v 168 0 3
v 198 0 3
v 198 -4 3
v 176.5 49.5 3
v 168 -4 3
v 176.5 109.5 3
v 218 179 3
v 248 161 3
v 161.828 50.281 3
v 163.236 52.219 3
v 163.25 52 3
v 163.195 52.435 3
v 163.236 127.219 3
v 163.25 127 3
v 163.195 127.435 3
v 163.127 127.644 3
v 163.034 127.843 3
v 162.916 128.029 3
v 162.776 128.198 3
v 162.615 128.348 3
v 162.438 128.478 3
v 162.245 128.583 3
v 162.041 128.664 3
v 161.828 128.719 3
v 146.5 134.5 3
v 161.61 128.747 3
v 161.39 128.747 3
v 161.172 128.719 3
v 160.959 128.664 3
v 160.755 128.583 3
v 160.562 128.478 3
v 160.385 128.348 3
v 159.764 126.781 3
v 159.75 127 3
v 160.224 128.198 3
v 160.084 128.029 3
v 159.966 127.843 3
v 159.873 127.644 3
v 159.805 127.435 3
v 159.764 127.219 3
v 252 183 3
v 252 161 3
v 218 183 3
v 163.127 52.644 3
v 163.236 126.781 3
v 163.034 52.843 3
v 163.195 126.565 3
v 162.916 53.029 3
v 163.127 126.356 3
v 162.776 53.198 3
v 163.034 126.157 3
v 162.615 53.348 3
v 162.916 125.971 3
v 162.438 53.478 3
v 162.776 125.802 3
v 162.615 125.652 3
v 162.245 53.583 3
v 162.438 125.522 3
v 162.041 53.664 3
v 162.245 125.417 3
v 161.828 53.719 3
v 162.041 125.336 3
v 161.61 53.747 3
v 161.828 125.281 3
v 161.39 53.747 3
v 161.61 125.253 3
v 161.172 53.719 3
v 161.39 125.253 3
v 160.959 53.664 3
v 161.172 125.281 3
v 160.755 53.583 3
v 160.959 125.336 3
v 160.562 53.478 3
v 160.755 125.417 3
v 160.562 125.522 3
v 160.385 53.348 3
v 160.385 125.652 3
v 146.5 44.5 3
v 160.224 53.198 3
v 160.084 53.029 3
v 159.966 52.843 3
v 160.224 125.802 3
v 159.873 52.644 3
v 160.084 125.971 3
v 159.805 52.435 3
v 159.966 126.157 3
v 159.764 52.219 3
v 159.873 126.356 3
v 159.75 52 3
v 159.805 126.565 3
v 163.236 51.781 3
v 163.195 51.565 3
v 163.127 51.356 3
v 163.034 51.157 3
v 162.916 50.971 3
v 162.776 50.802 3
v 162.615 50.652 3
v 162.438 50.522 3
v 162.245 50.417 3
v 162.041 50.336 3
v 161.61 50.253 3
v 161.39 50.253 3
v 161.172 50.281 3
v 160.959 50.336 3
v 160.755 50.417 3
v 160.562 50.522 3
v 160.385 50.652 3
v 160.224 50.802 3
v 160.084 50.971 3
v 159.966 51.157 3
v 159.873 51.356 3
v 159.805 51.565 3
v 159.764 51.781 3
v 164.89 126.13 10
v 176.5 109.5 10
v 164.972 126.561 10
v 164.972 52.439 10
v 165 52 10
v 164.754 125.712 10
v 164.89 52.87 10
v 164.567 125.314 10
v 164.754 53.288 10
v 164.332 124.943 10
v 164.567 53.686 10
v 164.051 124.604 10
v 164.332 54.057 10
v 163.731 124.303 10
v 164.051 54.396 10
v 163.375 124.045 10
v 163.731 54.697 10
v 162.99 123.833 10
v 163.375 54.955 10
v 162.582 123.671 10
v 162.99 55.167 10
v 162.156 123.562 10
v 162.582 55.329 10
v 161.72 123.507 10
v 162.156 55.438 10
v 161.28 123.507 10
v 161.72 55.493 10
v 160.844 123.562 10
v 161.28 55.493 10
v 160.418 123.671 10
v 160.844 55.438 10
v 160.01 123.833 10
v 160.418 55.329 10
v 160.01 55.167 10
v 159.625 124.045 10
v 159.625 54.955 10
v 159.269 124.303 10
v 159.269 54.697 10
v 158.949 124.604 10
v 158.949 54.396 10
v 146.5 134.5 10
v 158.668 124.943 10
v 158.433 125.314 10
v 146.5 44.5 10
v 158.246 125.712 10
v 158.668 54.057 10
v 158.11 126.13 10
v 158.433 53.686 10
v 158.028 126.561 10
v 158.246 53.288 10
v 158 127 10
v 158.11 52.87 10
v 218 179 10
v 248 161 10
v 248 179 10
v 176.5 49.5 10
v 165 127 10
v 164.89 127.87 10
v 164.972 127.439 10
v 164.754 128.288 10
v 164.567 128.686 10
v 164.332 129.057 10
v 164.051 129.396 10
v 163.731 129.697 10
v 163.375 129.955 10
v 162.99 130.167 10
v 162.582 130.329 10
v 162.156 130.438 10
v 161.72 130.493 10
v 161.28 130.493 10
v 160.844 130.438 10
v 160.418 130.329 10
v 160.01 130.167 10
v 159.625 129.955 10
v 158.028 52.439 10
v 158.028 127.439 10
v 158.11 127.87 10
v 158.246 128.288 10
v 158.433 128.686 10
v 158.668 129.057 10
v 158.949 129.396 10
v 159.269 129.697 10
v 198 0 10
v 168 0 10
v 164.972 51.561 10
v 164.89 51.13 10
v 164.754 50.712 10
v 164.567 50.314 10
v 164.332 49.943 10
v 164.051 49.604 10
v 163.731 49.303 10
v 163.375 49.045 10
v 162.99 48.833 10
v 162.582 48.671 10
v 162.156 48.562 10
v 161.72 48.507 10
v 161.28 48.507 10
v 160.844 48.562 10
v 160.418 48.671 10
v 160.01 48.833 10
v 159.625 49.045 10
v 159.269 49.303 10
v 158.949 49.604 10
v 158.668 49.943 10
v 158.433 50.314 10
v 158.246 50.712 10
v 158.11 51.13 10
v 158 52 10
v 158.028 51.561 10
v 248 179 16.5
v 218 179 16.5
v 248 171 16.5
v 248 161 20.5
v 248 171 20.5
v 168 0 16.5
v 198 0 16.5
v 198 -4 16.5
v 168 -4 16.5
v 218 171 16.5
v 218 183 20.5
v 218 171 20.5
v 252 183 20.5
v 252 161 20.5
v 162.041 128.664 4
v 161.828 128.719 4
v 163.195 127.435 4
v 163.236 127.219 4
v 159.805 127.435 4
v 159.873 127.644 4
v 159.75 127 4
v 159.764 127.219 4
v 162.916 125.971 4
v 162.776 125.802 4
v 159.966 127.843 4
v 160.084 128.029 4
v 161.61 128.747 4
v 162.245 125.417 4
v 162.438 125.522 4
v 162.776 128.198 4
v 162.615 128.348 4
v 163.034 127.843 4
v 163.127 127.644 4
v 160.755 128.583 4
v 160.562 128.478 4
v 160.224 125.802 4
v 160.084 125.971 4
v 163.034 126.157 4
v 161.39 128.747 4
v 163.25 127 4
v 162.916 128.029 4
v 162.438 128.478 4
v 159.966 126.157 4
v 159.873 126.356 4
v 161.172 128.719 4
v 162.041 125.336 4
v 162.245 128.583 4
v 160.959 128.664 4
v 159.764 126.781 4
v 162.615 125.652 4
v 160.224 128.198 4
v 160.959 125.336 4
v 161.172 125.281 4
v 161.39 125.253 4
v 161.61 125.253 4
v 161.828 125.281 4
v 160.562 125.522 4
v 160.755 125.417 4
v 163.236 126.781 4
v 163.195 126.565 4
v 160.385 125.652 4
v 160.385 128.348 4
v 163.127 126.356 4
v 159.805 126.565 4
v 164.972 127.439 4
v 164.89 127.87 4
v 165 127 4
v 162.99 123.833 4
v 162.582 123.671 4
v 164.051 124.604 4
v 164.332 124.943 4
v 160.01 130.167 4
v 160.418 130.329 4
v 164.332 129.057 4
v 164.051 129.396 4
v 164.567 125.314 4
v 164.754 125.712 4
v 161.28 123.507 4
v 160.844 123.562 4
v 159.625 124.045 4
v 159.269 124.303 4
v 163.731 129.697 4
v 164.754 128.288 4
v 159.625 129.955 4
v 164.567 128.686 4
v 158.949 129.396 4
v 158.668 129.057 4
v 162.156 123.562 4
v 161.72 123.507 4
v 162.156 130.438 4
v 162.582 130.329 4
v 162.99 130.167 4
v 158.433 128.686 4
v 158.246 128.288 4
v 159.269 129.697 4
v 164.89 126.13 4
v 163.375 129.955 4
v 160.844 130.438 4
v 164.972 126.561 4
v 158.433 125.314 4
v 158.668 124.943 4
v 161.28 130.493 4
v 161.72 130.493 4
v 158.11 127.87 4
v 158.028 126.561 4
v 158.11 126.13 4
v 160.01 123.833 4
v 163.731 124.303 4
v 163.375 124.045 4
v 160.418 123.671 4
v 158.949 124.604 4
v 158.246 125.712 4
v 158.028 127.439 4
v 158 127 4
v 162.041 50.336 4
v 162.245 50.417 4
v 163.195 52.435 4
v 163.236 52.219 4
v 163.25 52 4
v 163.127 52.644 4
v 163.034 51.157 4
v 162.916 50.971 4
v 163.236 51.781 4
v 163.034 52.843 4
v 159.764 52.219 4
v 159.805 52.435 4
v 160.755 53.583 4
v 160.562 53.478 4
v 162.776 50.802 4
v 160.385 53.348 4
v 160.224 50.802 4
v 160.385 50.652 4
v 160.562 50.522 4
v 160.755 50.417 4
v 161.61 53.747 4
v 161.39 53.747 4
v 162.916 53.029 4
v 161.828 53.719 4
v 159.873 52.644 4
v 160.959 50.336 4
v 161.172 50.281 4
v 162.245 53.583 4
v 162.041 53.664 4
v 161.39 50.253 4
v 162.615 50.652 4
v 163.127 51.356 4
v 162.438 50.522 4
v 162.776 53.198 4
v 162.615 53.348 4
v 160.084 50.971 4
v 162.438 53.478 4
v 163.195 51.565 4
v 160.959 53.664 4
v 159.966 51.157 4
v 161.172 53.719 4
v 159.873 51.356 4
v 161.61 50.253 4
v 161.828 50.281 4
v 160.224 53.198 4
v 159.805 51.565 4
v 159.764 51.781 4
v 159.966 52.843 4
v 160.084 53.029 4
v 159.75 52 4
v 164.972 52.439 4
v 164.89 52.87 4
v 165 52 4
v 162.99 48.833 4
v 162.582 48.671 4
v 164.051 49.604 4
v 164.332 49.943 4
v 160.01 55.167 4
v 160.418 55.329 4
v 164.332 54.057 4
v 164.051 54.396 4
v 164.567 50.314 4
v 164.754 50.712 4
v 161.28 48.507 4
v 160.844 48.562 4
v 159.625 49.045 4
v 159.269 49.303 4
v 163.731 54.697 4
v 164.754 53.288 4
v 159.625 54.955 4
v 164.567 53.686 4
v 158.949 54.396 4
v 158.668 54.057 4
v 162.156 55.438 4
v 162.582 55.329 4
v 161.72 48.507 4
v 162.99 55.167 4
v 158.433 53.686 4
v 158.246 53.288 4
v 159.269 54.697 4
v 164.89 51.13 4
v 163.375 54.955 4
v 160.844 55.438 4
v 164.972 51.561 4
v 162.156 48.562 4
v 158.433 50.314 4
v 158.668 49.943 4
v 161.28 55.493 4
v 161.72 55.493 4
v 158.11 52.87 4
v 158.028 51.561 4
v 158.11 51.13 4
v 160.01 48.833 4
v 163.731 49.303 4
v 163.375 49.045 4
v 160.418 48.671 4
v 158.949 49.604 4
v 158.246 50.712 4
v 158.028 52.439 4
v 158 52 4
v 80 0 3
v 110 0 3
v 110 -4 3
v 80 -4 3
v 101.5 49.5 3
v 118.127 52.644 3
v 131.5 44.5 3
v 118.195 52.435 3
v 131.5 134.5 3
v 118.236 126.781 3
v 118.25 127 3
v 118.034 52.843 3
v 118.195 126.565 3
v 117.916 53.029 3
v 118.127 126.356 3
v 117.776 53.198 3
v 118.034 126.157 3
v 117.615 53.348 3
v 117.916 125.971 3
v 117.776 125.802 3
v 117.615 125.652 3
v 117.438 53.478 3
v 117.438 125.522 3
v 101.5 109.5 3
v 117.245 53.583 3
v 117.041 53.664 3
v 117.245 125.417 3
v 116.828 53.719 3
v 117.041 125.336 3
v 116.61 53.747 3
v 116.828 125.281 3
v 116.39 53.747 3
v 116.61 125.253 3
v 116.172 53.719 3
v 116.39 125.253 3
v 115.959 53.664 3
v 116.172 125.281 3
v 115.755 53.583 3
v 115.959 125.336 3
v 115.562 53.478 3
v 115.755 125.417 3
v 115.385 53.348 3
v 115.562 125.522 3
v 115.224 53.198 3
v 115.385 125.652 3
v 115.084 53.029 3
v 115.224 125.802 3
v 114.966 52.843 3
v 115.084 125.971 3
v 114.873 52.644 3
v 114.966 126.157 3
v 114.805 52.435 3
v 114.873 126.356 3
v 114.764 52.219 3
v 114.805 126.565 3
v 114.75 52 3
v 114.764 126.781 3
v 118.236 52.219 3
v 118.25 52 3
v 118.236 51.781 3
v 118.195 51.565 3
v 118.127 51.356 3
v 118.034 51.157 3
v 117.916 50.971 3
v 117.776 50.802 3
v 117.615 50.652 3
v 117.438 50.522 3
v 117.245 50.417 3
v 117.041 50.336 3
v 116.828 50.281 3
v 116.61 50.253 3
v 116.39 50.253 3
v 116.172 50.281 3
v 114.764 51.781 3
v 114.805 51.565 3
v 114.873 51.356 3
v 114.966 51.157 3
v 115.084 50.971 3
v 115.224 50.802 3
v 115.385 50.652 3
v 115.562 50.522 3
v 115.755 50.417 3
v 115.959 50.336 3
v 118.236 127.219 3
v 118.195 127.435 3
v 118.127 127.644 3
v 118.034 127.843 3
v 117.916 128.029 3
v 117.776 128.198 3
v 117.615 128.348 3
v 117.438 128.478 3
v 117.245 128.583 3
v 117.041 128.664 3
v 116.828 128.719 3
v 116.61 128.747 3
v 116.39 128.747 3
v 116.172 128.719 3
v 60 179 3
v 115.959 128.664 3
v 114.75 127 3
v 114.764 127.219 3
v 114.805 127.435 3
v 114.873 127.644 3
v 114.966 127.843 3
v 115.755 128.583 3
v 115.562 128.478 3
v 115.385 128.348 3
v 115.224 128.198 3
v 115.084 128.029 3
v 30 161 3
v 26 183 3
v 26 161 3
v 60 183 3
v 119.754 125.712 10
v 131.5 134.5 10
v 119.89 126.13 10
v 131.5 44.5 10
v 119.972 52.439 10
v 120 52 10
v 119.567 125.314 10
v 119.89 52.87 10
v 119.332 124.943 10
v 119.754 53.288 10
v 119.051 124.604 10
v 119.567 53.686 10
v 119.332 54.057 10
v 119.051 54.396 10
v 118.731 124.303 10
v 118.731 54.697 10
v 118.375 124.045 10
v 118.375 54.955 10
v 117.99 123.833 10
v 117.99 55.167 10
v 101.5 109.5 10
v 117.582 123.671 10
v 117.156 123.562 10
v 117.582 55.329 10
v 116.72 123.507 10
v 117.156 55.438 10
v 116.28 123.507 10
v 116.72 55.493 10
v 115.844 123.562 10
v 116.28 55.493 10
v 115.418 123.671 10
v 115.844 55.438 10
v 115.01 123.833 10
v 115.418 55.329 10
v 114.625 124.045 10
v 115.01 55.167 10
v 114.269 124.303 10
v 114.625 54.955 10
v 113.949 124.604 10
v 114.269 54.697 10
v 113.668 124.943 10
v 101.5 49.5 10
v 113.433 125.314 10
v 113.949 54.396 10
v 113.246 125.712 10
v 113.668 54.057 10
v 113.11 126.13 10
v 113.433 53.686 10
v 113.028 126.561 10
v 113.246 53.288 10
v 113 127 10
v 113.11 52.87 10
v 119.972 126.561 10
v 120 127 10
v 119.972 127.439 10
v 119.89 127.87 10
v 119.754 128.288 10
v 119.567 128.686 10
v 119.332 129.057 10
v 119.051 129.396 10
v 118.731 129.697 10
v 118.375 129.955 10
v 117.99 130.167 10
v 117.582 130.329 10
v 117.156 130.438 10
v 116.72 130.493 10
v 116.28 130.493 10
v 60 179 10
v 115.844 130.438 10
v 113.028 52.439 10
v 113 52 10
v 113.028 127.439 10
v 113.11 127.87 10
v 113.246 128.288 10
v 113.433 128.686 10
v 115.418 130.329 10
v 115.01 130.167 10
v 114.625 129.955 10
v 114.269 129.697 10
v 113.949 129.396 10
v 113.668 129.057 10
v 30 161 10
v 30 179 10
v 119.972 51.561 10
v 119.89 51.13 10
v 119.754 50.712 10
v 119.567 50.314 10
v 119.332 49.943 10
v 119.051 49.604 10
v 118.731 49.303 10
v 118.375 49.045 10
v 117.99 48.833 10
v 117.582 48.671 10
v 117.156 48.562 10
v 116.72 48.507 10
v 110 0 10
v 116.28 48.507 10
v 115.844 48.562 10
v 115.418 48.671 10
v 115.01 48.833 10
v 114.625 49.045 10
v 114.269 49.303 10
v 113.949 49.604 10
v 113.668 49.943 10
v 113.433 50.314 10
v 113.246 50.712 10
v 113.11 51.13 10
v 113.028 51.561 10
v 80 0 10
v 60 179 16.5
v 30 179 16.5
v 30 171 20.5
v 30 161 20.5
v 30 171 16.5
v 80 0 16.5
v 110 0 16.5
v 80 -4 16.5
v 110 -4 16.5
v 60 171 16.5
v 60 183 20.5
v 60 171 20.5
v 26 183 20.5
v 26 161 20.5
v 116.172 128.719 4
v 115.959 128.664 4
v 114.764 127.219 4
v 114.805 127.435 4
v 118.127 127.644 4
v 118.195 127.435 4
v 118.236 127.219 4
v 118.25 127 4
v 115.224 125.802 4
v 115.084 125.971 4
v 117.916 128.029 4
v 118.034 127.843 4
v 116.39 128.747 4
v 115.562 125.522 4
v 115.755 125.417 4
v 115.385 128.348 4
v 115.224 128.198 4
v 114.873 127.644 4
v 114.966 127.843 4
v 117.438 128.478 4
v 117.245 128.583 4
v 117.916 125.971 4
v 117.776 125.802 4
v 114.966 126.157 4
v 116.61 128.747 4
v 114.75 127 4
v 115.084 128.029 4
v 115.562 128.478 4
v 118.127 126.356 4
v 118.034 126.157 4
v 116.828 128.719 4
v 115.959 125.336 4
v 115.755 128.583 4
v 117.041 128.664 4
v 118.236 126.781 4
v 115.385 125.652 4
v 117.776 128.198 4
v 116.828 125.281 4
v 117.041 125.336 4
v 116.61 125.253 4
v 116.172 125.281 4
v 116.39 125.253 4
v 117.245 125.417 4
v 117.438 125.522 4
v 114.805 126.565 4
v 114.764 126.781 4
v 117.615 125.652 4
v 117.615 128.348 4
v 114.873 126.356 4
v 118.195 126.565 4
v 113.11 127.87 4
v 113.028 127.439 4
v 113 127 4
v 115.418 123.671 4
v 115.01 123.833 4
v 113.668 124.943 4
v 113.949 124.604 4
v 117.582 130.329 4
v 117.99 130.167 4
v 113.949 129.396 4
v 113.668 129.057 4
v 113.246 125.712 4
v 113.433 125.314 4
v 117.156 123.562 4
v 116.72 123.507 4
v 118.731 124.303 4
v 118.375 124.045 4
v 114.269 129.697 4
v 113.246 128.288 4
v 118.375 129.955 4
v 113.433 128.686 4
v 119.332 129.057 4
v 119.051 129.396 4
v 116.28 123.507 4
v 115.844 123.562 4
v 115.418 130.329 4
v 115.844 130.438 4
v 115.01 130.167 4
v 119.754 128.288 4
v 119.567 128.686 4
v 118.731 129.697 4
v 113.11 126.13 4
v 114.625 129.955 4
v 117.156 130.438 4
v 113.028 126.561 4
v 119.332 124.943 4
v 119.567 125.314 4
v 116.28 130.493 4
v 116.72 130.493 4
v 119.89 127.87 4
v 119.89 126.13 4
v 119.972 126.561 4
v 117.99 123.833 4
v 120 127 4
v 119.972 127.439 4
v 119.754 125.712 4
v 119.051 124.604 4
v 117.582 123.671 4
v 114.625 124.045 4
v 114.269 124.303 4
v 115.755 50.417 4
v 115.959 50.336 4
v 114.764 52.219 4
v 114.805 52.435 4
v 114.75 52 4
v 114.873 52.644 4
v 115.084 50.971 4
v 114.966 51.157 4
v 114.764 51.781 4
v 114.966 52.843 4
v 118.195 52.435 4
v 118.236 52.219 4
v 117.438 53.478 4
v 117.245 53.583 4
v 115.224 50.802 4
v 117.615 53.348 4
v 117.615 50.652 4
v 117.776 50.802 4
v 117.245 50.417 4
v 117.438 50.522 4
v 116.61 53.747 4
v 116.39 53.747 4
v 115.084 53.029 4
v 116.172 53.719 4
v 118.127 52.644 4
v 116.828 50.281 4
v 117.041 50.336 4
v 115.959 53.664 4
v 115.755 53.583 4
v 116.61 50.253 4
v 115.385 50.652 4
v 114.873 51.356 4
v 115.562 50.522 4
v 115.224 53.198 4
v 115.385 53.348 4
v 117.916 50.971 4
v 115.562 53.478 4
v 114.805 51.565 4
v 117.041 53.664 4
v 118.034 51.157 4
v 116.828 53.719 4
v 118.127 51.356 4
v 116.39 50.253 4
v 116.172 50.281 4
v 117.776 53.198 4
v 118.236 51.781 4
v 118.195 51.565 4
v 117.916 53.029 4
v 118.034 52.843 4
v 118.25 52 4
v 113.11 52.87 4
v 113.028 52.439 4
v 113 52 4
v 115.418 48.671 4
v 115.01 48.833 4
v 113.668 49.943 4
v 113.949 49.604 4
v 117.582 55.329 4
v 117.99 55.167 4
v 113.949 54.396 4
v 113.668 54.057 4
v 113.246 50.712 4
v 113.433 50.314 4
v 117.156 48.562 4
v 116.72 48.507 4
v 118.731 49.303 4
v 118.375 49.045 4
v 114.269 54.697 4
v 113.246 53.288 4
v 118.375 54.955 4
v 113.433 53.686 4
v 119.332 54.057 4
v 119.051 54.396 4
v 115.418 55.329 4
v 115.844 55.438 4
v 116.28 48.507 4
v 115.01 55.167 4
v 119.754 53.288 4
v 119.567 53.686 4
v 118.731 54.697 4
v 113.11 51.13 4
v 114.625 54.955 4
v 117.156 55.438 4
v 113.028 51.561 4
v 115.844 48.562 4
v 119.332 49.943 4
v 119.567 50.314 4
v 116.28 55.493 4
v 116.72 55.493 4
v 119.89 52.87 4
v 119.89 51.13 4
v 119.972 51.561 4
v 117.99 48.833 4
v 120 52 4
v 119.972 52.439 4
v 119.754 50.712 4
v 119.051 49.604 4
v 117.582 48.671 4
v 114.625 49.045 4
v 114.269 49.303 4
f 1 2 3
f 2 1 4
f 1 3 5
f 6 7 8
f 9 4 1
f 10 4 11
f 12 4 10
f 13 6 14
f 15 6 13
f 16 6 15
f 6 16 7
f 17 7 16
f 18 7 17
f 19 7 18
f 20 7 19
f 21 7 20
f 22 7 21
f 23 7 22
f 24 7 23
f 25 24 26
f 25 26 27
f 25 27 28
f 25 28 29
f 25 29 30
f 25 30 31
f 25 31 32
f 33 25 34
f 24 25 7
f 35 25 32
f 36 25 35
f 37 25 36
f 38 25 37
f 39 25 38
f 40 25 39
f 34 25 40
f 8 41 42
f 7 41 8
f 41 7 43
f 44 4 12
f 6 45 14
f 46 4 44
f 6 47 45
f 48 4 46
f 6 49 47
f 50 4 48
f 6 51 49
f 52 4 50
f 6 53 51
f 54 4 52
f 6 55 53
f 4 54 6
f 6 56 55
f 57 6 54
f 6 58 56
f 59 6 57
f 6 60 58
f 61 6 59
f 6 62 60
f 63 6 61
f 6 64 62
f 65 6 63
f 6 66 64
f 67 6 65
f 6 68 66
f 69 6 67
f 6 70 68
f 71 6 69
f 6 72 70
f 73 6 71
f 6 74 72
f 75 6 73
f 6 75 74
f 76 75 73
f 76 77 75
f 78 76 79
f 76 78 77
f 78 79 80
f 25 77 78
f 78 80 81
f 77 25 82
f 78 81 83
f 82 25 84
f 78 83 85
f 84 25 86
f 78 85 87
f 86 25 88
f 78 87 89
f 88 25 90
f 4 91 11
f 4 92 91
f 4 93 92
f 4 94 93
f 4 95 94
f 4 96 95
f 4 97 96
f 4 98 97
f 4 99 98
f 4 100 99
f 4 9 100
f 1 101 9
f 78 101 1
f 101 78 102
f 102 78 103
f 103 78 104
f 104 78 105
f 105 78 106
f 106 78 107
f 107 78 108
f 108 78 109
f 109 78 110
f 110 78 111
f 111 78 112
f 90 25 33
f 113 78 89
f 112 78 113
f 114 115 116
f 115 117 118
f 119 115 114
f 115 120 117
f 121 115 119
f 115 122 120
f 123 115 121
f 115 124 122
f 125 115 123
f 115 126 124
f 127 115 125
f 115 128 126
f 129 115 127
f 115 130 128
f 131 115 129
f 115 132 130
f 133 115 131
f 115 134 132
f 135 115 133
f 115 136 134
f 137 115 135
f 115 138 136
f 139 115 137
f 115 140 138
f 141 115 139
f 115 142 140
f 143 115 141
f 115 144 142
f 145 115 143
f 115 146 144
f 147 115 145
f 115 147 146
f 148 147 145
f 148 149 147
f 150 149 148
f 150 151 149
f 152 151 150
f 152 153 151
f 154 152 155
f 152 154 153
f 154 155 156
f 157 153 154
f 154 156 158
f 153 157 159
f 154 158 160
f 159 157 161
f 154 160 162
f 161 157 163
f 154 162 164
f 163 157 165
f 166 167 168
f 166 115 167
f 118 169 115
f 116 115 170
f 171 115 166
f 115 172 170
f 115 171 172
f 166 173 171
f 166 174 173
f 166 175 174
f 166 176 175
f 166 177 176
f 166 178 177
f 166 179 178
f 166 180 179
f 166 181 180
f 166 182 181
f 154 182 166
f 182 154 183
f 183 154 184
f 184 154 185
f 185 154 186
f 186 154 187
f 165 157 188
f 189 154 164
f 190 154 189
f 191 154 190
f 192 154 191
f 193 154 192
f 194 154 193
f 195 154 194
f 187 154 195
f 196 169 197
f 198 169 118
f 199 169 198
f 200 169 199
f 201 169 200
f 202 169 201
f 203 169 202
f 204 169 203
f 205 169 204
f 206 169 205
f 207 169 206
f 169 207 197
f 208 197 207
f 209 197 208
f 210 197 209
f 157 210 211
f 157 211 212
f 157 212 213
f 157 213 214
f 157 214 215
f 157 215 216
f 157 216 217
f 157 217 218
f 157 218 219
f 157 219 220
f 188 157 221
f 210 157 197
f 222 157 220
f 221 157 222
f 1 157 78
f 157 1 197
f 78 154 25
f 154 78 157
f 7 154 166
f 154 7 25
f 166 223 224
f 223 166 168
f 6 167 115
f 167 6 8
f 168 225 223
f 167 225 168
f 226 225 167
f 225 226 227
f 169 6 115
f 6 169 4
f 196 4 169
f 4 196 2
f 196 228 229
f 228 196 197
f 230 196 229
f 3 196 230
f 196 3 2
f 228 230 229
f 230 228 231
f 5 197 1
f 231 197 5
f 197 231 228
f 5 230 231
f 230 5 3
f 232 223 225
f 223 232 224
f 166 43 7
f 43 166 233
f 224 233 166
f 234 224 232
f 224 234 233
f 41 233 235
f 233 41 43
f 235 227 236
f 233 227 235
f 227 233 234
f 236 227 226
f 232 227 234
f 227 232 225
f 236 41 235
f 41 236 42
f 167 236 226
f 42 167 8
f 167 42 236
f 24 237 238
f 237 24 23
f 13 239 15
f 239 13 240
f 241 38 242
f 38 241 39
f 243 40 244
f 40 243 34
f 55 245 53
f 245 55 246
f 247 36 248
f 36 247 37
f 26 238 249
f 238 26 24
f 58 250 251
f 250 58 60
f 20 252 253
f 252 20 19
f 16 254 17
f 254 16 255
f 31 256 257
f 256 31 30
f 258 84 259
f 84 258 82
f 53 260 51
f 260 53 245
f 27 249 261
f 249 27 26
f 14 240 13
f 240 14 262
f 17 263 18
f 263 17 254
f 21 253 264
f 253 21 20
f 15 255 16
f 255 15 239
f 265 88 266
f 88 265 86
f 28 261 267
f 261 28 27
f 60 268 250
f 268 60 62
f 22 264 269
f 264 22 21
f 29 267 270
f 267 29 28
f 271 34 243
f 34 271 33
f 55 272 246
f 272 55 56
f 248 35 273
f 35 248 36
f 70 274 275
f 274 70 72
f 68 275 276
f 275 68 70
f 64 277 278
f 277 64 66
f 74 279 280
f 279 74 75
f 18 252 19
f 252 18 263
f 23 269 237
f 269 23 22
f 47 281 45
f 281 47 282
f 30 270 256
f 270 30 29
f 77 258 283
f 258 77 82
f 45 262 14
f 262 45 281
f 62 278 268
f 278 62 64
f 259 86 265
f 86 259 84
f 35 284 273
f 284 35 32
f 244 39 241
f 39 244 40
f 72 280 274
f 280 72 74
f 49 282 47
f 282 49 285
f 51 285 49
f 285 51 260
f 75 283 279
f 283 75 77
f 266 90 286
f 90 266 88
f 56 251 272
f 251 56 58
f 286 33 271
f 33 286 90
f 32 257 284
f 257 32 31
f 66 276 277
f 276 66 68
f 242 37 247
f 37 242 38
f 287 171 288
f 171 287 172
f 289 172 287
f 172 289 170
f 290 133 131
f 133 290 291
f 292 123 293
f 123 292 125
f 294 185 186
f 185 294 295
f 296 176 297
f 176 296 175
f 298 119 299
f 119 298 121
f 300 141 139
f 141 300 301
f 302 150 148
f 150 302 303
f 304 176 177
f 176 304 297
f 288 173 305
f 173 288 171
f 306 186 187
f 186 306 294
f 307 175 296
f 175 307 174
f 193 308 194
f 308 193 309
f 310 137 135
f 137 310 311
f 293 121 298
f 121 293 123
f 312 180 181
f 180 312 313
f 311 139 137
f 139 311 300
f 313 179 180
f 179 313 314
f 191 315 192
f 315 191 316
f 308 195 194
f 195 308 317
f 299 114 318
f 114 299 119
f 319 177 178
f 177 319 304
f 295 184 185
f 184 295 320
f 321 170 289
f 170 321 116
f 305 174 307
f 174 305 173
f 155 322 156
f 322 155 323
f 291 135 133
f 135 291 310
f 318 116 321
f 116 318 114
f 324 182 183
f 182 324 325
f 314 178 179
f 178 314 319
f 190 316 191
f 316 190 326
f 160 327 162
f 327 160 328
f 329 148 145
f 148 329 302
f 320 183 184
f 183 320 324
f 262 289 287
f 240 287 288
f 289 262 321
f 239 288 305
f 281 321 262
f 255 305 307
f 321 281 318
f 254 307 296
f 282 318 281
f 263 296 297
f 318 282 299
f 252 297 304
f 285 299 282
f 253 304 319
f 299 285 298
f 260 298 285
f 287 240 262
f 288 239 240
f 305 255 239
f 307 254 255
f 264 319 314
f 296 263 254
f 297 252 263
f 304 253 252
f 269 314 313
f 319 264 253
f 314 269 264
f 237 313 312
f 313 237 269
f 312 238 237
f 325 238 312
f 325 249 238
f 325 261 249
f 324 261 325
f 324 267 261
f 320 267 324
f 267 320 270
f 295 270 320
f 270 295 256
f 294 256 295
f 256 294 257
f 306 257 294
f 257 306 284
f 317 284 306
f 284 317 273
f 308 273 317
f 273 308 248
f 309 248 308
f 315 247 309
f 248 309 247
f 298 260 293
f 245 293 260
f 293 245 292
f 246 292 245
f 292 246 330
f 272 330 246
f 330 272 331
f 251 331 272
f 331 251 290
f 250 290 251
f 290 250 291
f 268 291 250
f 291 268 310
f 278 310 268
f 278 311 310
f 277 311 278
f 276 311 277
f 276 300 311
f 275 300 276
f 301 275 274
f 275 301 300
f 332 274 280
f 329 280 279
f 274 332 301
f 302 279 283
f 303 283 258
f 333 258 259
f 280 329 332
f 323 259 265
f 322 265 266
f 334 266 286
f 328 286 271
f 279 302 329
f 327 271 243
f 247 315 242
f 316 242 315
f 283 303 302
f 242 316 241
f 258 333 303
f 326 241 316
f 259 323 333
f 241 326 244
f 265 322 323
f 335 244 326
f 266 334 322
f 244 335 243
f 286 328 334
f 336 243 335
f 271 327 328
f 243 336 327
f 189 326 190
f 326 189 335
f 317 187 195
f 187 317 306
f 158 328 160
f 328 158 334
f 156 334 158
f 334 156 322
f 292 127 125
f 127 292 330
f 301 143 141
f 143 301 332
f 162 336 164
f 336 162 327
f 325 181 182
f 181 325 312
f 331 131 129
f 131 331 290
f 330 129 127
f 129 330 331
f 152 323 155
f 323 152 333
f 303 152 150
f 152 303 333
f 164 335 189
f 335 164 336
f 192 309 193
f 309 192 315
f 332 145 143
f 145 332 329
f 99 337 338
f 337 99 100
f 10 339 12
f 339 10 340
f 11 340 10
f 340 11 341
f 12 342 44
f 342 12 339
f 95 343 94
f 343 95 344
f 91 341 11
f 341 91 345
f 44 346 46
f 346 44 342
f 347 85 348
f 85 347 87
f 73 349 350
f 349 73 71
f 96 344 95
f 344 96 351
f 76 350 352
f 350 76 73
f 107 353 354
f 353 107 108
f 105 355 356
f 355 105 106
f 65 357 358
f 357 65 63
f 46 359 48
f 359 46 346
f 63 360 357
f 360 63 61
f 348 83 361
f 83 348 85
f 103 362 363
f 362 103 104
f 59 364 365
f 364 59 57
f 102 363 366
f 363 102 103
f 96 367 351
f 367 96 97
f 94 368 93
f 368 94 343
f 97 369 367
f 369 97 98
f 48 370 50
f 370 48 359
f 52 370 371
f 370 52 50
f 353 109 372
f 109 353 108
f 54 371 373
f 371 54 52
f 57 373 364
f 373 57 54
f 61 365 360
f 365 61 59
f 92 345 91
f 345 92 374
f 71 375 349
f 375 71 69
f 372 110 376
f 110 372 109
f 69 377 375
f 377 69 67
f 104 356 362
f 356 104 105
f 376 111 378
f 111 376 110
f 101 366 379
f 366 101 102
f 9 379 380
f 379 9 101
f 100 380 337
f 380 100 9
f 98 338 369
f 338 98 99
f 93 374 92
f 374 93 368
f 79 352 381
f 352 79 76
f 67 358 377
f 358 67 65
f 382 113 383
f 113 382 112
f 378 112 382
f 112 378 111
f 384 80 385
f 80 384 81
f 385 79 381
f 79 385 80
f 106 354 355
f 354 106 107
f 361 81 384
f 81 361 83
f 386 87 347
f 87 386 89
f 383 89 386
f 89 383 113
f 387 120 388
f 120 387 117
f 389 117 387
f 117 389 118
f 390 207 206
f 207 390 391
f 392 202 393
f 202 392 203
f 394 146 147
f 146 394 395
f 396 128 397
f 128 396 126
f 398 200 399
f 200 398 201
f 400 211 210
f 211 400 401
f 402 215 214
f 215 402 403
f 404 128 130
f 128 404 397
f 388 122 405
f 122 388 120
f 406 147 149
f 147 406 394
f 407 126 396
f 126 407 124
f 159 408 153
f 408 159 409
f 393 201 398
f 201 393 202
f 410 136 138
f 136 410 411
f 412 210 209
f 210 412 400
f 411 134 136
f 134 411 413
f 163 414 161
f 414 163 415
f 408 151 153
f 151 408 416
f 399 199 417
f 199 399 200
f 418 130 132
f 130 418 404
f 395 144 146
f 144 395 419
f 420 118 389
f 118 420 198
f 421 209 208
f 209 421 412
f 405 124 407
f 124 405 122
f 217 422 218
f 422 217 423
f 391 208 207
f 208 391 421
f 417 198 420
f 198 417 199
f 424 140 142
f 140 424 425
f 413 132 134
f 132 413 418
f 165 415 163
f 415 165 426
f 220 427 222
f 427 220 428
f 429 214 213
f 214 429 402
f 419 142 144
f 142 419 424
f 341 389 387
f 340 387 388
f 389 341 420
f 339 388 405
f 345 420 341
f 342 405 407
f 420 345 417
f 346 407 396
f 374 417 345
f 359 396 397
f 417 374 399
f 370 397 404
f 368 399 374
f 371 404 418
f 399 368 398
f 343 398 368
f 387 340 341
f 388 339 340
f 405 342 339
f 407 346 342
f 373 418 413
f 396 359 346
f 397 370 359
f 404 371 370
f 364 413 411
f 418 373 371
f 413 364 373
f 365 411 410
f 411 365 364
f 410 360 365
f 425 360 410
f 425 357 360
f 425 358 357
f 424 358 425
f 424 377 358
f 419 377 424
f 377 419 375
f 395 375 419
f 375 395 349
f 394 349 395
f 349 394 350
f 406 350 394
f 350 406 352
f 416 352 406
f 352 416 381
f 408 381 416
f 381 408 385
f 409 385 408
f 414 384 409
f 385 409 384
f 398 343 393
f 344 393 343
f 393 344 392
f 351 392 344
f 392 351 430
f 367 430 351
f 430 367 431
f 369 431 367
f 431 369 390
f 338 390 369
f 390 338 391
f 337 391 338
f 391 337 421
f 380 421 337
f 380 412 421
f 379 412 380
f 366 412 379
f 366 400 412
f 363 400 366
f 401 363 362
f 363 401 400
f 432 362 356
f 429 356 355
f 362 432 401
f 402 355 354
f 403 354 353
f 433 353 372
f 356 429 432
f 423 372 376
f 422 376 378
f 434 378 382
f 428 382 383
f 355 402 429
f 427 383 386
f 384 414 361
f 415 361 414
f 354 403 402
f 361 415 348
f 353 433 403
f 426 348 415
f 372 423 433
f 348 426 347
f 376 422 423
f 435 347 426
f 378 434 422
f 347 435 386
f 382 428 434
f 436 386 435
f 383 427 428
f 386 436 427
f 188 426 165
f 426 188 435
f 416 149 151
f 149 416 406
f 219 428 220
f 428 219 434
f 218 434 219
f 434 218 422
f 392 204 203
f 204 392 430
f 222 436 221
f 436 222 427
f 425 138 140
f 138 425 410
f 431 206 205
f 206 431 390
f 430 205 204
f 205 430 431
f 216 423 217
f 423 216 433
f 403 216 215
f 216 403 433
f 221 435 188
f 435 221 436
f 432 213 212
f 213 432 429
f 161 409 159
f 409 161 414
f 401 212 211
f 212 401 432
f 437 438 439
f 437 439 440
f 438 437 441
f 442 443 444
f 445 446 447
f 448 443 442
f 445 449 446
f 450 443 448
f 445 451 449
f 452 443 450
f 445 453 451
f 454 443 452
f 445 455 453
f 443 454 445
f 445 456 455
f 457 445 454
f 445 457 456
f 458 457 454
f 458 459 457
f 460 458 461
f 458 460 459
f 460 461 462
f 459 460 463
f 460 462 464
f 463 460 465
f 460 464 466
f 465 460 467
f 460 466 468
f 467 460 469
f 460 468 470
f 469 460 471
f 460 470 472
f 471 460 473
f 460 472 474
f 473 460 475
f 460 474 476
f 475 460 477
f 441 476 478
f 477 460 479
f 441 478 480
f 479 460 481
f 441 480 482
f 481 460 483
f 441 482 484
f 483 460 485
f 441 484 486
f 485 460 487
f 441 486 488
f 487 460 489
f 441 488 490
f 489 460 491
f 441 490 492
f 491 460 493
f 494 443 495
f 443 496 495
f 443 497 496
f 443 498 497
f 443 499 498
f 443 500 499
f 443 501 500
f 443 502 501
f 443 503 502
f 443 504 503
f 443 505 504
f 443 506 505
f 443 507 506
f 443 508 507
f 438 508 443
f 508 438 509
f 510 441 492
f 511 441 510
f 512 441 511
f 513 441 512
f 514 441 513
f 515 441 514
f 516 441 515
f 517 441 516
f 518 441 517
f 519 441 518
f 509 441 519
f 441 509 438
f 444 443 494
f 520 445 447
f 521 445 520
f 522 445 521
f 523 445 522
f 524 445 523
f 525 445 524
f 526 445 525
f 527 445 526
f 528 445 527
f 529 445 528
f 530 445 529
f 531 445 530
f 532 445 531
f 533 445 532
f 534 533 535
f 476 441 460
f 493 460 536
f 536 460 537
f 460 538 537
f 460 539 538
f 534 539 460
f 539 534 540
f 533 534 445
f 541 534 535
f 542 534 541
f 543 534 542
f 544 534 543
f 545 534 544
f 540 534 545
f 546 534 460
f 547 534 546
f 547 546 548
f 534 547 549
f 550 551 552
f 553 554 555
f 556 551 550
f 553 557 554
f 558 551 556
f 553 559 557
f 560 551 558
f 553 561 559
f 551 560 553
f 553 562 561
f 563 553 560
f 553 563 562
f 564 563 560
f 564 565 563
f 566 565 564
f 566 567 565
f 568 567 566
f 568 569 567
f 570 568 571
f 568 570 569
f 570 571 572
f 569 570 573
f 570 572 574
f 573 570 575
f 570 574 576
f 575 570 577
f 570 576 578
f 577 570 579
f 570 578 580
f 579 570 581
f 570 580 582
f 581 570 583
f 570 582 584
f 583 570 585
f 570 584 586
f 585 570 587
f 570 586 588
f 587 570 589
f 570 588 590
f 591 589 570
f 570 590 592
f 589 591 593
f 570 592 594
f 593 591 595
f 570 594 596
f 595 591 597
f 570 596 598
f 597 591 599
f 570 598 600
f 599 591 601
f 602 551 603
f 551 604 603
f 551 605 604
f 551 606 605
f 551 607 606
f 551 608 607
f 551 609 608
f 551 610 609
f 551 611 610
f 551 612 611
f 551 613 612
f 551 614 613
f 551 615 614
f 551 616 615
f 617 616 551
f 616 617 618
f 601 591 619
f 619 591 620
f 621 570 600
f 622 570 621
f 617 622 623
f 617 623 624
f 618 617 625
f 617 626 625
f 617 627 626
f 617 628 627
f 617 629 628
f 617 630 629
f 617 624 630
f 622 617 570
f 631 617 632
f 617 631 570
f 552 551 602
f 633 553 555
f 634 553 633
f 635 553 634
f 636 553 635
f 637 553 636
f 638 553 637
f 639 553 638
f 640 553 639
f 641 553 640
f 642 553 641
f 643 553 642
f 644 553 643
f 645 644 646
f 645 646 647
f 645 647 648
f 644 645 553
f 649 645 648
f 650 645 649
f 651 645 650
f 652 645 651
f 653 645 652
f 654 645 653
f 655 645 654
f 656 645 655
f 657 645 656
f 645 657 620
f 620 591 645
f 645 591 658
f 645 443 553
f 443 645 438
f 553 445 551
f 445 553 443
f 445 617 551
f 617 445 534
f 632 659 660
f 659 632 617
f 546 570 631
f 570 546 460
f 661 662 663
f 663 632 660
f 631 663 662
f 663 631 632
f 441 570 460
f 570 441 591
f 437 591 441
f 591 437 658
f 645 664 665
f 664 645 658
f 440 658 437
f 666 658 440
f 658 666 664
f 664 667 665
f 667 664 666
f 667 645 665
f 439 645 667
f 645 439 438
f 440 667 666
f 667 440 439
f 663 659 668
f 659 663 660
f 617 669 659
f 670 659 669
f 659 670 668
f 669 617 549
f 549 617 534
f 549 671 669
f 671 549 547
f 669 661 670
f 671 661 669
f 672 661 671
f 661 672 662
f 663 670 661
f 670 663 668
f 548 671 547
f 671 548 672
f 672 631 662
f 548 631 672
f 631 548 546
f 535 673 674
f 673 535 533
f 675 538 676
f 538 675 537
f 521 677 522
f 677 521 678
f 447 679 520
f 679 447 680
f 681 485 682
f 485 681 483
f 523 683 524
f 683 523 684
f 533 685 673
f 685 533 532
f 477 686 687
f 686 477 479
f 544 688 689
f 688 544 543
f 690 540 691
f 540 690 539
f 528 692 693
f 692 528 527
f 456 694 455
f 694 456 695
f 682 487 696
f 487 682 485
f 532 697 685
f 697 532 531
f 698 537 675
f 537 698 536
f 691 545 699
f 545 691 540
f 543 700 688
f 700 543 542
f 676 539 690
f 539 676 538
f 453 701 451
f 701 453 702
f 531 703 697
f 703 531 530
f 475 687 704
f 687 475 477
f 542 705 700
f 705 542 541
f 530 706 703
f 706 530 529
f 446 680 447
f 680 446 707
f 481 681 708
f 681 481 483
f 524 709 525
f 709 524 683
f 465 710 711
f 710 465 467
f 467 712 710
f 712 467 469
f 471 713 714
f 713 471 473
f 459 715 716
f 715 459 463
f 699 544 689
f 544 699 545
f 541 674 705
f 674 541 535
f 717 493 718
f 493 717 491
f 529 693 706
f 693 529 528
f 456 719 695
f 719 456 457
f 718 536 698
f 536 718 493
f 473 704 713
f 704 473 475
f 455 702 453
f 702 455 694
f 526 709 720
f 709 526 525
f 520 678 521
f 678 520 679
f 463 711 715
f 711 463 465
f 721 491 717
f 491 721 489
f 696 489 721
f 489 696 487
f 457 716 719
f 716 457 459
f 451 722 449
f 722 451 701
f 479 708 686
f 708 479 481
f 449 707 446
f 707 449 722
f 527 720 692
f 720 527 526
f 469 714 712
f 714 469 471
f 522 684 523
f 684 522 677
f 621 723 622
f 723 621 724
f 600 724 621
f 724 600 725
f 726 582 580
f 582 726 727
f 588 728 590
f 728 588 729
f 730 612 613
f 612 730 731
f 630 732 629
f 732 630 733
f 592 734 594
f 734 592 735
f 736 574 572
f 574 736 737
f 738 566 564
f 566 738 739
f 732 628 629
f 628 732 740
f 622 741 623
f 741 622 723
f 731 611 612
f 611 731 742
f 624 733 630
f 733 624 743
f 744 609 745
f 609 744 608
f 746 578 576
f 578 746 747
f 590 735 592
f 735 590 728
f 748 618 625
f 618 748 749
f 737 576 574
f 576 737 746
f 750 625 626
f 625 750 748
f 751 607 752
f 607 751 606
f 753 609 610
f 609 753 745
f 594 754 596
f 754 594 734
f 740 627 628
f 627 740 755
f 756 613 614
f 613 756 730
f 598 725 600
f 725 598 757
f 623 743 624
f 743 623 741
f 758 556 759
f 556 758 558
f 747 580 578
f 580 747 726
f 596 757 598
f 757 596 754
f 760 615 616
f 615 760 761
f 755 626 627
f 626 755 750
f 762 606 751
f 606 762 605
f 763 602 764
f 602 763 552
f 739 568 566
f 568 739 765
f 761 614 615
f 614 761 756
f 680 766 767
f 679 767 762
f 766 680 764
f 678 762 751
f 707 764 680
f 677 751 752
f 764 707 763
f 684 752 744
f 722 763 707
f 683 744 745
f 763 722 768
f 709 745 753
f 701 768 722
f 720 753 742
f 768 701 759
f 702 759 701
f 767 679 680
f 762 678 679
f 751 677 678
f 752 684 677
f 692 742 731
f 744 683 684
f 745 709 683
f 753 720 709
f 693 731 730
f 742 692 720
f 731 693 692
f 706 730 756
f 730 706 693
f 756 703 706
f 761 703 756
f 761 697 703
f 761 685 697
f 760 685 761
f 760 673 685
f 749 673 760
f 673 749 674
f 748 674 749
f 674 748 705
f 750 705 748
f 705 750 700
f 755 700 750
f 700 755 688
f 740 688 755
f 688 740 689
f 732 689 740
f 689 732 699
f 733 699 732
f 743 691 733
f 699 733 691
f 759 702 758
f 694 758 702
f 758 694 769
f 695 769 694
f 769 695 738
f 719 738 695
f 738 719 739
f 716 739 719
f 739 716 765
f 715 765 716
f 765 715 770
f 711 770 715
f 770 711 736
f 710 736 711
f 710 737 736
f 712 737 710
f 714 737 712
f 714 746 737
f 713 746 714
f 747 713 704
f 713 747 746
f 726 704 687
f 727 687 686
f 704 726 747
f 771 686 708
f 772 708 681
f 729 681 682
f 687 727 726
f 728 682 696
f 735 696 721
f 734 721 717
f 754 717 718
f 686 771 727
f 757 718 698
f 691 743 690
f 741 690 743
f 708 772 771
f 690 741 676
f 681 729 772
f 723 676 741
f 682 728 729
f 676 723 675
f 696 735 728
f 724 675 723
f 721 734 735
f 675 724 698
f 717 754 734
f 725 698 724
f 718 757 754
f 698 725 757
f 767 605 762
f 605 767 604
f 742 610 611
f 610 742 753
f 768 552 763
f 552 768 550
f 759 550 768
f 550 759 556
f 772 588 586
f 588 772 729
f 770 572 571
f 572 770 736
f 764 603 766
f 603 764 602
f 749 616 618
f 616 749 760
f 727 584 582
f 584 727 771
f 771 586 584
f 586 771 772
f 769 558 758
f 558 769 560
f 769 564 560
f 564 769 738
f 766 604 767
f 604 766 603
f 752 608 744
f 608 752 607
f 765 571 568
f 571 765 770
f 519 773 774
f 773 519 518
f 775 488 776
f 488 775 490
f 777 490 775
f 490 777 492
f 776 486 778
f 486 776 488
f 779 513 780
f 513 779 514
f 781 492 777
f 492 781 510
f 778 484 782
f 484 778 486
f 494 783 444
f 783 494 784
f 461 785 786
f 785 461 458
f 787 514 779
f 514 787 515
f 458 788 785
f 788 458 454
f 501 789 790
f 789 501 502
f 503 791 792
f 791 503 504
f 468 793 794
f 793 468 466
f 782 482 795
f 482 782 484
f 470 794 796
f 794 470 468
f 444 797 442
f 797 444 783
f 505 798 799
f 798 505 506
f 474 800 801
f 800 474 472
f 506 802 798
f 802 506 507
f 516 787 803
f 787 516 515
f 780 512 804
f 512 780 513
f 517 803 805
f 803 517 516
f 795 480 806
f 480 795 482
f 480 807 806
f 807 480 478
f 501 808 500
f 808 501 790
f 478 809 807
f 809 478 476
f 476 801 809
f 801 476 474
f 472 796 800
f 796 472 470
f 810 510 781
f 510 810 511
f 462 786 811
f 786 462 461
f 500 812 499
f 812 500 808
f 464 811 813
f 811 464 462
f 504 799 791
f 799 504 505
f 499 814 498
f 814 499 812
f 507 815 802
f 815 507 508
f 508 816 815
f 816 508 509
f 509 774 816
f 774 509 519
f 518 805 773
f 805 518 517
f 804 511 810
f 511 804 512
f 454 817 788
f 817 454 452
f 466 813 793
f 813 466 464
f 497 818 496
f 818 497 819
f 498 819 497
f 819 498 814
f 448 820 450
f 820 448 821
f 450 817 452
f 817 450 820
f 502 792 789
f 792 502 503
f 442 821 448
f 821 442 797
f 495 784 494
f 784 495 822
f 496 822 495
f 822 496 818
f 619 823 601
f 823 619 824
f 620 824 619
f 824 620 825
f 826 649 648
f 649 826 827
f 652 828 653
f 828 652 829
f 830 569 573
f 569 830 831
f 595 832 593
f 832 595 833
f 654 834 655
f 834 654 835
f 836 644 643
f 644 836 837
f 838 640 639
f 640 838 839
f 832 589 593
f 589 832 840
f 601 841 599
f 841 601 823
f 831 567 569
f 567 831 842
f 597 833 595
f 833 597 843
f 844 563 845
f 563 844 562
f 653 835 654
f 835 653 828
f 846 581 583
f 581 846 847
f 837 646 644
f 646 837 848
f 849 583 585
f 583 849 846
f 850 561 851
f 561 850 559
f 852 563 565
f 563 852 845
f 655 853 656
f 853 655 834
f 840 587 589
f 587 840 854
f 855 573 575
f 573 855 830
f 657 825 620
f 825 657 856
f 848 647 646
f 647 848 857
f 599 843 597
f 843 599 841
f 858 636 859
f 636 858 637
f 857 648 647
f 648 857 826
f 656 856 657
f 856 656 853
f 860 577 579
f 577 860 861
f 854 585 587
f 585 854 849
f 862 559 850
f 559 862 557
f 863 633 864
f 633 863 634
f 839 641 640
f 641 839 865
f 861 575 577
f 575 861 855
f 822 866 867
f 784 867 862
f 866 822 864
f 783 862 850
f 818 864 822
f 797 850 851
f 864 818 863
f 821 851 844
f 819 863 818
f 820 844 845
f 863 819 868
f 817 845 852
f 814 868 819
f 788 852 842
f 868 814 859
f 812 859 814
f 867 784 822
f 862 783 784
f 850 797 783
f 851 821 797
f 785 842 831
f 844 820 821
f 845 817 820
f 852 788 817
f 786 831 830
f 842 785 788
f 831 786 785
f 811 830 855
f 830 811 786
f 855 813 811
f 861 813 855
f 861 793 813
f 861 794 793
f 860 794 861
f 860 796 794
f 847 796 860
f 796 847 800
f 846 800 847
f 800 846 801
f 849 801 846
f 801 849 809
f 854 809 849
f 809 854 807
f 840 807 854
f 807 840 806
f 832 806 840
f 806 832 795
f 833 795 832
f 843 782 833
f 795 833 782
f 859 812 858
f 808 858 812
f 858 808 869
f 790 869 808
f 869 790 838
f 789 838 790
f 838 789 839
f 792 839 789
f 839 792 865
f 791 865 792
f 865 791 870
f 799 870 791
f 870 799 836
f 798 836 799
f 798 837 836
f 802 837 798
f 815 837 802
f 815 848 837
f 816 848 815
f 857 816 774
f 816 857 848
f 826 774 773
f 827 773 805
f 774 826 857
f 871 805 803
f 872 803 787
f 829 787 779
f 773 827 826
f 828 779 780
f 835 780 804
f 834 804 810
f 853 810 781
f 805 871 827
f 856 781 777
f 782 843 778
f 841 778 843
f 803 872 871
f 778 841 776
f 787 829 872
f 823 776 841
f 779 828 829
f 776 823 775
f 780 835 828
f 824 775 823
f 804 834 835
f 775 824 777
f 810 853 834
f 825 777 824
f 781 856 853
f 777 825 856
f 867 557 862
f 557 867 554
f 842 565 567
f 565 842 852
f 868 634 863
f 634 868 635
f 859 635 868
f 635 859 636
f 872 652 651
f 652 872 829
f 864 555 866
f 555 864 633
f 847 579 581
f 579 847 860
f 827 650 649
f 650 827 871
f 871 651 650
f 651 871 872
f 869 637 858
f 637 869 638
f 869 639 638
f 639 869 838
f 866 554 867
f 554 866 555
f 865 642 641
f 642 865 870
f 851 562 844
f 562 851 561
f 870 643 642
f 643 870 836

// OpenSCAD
SHOW_IPAD = false;
SHOW_VESA_MOUNT = false;

//IPAD_SIZE = [248,179,6.5];
IPAD_SIZE = [248,179,6.5];
MINKOWSKI_SIZE = 20;
IPAD_COORDINATES = [IPAD_SIZE.x - MINKOWSKI_SIZE*2, IPAD_SIZE.y - MINKOWSKI_SIZE*2, IPAD_SIZE.z];

VESA_PLATE_SIZE = [100,100,3];
VESA_MOUNT_SIZE = [75,75];

LIP_SIDE_HEIGHT = 18;
LIP_HEIGHT = 8;
LIP_DEPTH = 4;
DEPTH=7;
WIDTH=30;

LIP_SIZE = [IPAD_SIZE.z + LIP_DEPTH, 5];
BACK_SIZE = [IPAD_SIZE.x + LIP_SIZE.y * 2, IPAD_SIZE.y + LIP_SIZE.y, IPAD_SIZE.z];
$fn=50;

if (SHOW_IPAD) {
  translate([MINKOWSKI_SIZE, MINKOWSKI_SIZE, LIP_DEPTH]) color("grey") minkowski()
  {
    cube(IPAD_COORDINATES);
    cylinder(r=MINKOWSKI_SIZE,h=1);
  }
}


if (SHOW_VESA_MOUNT) {
  difference() {
    translate([(IPAD_SIZE.x / 2) - (VESA_PLATE_SIZE.x / 2), IPAD_SIZE.y / 2 - VESA_PLATE_SIZE.y / 2, -VESA_PLATE_SIZE.z]) 
      color("red") cube(VESA_PLATE_SIZE);

    translate([IPAD_SIZE.x/2, IPAD_SIZE.y/2, 0])
      for(x=[1,-1]) for(y=[1,-1]) 
	translate([(VESA_MOUNT_SIZE.x/2) * x, (VESA_MOUNT_SIZE.y/2) * y, -10]) 
	  cylinder(r=3.5/2, h=25);
  }
}


translate([IPAD_SIZE.x/2, IPAD_SIZE.y/2, 0]) { 
  ipad_arm();
  if (!SHOW_IPAD) 
    translate([30,0,0]) mirror([1,0,0]) ipad_arm();
  if (SHOW_IPAD) 
    mirror([1,0,0]) ipad_arm();
}

module ipad_arm() {
  
      X_OFFSET=VESA_MOUNT_SIZE.x/2-WIDTH/2;
  
      difference() {
        union() {
          translate([0,0,3]) { 
            polyhedron(
              points = [
                [X_OFFSET, -45, 0],                                              //0
                [X_OFFSET, 45, 0],                                               //1
                [IPAD_SIZE.x/2-WIDTH, IPAD_SIZE.y/2, 0],                         //2
                [IPAD_SIZE.x/2, IPAD_SIZE.y/2, 0],                               //3
                [X_OFFSET + WIDTH, 20, 0],                                       //4
                [X_OFFSET + WIDTH, -40, 0],                                      //5
                [IPAD_SIZE.x/2-50, -IPAD_SIZE.y/2, 0],                           //6
                [IPAD_SIZE.x/2-50-WIDTH, -IPAD_SIZE.y/2, 0],                     //7

                [IPAD_SIZE.x/2-50-WIDTH, -IPAD_SIZE.y/2, DEPTH],                 //8 (7)
                [X_OFFSET, -45, DEPTH],                                          //9 (0)
                [X_OFFSET, 45, DEPTH],                                           //10 (1)
                [IPAD_SIZE.x/2-WIDTH,    IPAD_SIZE.y/2, DEPTH],                  //11 (2)
                [IPAD_SIZE.x/2, IPAD_SIZE.y/2, DEPTH],                           //12 (3)
                [X_OFFSET + WIDTH, 20, DEPTH],                                   //13 (4)
                [X_OFFSET + WIDTH, -40, DEPTH],                                  //14 (5)
                [IPAD_SIZE.x/2-50, -IPAD_SIZE.y/2, DEPTH],                       //15 (6)

                [IPAD_SIZE.x/2, IPAD_SIZE.y/2-LIP_SIDE_HEIGHT, 0],                    //16 
                [IPAD_SIZE.x/2, IPAD_SIZE.y/2-LIP_SIDE_HEIGHT, DEPTH],                //17
              ], faces = [
                [7,6,5,4,16,3,2,1,0],
                [8,9,10,11,12,17,13,14,15],
                [0,9,8,7],
                [0,1,10,9],
                [1,2,11,10],
                [2,3,12,11],
                [13,17,16,4],
                [17,12,3,16],
                [14,13,4,5],
                [15,14,5,6],
                [6,7,8,15],
              ]
           );

           // upper lip
           translate([IPAD_SIZE.x/2-50-WIDTH, -IPAD_SIZE.y/2-LIP_DEPTH, 0]) cube([WIDTH, LIP_DEPTH, DEPTH+IPAD_SIZE.z]);
           // lower lip
           translate([IPAD_SIZE.x/2-WIDTH, IPAD_SIZE.y/2, 0]) cube([WIDTH, LIP_DEPTH, DEPTH+IPAD_SIZE.z]);
           translate([IPAD_SIZE.x/2-WIDTH, IPAD_SIZE.y/2-LIP_HEIGHT, (DEPTH+IPAD_SIZE.z)]) cube([WIDTH, LIP_HEIGHT+LIP_DEPTH, LIP_DEPTH]);
           translate([IPAD_SIZE.x/2, IPAD_SIZE.y/2-LIP_SIDE_HEIGHT, 0]) cube([LIP_DEPTH, LIP_SIDE_HEIGHT+LIP_DEPTH, LIP_DEPTH+DEPTH+IPAD_SIZE.z]);

         } //translate [0,0,3]
       } //union

       for(y=[1,-1]) {
         translate([(VESA_MOUNT_SIZE.x/2), (VESA_MOUNT_SIZE.y/2) * y, -8]) cylinder(r=3.5/2, h=25);
         translate([(VESA_MOUNT_SIZE.x/2), (VESA_MOUNT_SIZE.y/2) * y, 4]) cylinder(r=7/2, h=7);
       }
     } //difference

}
